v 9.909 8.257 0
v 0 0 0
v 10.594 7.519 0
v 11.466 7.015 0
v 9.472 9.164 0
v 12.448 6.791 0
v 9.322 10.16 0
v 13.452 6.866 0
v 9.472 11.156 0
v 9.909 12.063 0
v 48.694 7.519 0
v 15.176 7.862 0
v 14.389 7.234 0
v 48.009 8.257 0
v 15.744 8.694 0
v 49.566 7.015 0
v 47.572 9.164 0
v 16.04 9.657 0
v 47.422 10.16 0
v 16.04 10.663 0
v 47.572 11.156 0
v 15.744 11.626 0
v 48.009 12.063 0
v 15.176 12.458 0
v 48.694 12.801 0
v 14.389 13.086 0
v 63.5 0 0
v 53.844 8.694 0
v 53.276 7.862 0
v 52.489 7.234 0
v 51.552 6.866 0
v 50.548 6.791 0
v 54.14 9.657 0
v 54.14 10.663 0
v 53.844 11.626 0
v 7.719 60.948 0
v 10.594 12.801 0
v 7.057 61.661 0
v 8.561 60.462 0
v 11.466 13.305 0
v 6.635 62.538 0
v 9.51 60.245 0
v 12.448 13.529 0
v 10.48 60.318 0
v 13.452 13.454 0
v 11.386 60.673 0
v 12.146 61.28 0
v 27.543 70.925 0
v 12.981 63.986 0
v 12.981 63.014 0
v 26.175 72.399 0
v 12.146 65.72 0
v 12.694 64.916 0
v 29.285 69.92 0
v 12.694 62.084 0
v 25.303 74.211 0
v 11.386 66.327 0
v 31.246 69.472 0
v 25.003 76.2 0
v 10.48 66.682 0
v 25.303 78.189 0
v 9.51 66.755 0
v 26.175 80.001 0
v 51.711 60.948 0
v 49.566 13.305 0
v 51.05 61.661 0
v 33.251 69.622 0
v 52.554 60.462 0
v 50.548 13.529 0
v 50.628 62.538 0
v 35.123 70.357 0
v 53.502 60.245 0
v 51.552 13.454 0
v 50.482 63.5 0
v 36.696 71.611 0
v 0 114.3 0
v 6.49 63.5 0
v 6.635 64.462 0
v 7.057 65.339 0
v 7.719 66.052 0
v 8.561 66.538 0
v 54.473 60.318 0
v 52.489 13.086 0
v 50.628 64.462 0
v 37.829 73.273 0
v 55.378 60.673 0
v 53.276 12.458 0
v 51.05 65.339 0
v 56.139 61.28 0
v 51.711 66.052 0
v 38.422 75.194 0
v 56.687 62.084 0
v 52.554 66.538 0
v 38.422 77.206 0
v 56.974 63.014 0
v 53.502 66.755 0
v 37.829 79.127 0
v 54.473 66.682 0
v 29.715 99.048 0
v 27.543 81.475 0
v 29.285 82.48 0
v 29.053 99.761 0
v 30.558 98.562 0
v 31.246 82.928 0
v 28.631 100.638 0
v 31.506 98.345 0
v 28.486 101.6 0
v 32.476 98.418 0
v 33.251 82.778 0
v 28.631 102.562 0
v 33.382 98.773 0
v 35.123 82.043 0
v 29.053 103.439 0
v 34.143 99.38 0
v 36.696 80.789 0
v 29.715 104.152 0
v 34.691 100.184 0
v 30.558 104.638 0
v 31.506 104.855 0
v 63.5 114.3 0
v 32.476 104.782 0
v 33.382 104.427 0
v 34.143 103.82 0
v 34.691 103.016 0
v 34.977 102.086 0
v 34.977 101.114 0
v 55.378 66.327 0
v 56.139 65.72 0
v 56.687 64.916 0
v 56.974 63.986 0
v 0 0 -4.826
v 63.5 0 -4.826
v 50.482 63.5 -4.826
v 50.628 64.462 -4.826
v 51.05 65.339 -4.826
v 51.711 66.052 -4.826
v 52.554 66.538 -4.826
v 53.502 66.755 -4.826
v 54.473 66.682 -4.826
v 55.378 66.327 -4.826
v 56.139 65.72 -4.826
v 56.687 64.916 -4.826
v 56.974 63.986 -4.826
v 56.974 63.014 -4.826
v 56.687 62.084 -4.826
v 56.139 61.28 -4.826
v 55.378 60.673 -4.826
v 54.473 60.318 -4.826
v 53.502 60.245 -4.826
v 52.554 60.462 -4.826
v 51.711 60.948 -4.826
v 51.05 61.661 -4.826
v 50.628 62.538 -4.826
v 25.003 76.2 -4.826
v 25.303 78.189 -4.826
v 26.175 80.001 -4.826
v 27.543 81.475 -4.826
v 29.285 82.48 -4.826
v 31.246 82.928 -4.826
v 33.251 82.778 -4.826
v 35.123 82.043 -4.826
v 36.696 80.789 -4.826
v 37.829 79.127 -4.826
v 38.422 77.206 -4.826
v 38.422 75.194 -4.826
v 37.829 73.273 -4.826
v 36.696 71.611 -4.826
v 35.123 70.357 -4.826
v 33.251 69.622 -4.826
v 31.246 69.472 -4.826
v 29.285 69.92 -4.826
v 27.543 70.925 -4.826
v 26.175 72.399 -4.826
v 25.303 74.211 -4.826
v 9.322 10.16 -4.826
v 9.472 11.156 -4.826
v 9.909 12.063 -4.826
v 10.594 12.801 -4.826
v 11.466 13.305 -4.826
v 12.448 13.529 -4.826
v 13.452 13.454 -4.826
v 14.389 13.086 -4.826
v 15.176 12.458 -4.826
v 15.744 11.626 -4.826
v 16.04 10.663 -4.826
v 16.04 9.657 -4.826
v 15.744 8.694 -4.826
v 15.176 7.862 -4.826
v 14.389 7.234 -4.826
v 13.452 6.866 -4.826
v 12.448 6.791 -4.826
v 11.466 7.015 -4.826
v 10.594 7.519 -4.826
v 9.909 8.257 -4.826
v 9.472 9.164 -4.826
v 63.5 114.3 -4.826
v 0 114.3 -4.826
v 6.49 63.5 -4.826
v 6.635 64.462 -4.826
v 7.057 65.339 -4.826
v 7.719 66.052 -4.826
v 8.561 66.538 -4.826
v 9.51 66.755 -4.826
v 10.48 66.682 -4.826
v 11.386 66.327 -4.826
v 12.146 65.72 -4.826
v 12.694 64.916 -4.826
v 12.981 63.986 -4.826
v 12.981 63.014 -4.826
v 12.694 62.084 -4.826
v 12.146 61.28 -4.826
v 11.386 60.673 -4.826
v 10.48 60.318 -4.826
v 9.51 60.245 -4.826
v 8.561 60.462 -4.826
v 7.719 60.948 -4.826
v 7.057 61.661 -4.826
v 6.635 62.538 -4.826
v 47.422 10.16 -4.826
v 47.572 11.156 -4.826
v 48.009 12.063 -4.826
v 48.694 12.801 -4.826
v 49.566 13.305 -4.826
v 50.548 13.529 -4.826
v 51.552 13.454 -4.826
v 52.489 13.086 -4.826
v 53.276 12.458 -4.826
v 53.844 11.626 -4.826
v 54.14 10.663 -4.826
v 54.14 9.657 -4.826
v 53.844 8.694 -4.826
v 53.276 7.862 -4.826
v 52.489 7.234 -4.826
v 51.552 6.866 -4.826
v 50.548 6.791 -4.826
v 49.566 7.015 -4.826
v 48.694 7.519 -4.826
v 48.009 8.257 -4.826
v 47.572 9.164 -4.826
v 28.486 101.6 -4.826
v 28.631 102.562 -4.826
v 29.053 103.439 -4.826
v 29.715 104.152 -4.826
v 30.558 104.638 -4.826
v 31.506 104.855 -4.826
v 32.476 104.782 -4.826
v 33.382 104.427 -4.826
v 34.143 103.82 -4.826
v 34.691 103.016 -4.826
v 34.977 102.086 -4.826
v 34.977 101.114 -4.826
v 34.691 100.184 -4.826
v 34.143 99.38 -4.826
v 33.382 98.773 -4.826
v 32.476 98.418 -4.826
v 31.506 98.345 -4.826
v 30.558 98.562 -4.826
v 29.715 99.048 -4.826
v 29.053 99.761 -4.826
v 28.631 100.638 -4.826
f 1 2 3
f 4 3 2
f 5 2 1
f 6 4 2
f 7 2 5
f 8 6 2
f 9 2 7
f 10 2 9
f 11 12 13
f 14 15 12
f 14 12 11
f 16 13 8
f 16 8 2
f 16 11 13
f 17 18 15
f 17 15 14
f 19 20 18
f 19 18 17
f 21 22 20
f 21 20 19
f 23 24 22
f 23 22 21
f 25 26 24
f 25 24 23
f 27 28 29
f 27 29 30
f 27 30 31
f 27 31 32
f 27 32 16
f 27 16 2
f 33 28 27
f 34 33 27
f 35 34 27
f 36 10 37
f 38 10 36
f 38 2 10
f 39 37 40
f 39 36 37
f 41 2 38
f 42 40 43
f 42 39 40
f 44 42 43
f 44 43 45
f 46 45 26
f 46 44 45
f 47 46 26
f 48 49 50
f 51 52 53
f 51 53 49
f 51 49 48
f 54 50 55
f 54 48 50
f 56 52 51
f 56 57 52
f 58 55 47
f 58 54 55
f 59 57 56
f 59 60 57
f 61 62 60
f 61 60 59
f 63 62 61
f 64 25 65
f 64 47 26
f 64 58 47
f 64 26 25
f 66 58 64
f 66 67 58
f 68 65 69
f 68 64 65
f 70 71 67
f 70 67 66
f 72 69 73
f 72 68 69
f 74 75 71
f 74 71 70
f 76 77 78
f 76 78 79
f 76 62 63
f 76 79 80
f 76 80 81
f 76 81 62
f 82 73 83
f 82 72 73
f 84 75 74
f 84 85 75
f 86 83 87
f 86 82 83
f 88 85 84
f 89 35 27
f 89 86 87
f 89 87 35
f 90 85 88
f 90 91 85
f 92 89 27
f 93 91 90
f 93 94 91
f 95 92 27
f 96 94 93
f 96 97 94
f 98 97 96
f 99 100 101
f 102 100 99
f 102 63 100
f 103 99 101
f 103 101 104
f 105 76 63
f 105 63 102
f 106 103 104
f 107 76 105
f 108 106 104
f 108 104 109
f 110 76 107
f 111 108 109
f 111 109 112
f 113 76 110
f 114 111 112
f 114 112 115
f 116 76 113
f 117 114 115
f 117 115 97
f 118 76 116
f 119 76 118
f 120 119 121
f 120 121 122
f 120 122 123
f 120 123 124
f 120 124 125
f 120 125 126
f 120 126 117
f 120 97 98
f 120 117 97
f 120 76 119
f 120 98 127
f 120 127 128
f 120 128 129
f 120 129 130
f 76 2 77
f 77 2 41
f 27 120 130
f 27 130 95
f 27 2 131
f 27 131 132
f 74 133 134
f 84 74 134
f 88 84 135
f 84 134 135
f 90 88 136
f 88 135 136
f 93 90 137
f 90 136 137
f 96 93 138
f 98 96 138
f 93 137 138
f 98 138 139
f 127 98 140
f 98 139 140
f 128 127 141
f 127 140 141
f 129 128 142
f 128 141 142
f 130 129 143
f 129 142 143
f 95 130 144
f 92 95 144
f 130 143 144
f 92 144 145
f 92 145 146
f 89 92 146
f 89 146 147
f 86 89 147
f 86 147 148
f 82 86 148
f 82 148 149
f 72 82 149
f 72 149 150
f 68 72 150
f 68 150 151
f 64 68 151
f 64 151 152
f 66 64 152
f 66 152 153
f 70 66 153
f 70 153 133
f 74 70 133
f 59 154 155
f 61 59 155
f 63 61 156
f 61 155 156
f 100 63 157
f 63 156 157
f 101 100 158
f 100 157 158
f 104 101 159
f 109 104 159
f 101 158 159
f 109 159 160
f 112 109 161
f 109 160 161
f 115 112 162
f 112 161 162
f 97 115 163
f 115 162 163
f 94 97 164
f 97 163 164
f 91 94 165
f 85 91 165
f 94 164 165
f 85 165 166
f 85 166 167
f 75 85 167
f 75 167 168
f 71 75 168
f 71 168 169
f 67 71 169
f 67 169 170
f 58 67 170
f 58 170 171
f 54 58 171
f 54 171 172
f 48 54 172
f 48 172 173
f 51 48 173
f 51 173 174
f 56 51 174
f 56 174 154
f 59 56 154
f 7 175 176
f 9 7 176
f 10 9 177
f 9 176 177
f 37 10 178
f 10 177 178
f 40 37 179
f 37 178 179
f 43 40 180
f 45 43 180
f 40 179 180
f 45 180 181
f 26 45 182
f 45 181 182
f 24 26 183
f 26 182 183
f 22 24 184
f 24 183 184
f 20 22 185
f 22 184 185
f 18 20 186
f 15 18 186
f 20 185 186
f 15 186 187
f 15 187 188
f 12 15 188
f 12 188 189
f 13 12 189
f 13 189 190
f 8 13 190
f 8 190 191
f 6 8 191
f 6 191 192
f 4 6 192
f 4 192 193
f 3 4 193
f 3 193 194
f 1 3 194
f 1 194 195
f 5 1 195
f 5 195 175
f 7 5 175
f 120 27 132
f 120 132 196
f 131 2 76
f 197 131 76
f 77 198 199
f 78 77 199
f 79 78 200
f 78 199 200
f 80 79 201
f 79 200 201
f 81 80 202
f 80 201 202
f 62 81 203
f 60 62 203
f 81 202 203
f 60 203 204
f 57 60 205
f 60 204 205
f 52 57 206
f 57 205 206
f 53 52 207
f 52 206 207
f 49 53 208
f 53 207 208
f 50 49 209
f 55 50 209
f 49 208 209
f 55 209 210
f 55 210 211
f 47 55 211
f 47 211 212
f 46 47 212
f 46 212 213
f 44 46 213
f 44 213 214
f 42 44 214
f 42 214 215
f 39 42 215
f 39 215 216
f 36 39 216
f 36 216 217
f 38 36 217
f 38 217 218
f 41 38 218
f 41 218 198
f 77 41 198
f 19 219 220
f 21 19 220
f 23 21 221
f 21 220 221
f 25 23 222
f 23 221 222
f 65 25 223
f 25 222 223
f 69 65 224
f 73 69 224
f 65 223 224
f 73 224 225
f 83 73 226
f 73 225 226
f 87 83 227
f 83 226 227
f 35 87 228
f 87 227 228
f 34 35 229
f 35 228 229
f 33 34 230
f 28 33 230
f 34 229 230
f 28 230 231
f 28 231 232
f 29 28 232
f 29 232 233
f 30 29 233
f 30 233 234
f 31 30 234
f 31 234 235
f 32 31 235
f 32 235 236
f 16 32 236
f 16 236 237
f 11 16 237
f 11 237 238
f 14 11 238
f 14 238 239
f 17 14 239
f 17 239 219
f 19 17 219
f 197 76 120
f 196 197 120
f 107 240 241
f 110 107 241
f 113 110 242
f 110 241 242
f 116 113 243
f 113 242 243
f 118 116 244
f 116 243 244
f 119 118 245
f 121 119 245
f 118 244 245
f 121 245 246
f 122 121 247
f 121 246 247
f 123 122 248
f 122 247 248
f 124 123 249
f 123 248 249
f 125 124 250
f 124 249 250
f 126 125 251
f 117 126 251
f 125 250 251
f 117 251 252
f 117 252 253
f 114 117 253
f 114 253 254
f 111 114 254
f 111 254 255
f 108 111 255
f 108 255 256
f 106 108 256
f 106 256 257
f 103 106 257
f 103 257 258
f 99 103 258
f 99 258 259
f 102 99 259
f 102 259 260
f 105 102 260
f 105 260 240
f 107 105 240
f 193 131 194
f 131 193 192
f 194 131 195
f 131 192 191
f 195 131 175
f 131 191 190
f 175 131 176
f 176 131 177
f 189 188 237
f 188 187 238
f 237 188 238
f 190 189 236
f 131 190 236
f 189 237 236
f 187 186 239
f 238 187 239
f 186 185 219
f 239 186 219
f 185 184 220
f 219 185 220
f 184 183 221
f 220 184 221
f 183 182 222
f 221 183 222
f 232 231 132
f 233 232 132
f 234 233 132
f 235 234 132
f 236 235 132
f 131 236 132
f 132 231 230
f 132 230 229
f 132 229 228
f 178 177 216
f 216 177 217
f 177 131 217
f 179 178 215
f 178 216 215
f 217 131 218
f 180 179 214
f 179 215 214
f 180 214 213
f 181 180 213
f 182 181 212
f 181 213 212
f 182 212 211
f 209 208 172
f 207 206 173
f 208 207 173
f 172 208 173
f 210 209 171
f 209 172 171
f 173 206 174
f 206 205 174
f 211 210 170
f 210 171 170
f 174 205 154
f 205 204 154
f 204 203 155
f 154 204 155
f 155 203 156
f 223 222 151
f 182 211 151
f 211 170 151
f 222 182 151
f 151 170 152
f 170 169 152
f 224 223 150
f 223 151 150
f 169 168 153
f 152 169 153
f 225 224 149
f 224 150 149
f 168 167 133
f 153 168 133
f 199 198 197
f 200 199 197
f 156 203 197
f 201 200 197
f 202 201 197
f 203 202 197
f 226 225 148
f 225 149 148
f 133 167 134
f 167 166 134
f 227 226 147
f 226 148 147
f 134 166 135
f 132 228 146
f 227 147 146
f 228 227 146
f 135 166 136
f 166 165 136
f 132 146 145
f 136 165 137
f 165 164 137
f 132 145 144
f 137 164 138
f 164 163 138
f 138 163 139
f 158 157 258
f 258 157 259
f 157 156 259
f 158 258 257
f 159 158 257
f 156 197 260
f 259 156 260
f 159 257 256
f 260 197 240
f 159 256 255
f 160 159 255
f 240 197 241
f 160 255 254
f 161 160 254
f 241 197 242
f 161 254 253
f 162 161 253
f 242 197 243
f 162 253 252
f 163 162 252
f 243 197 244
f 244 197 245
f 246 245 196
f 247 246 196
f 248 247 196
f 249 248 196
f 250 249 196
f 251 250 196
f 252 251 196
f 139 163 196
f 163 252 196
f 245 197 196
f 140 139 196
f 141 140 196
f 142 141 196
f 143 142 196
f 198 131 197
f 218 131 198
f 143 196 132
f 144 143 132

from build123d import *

# Parameters (mm, degrees)
SKETCH1_W                        = 63.5
SKETCH1_H                        = 114.3
BOSS_EXTRUDE1_DEPTH              = 4.826
F_0_257_DIAMETER_HOLE2_D         = 6.7564
F_0_257_DIAMETER_HOLE5_D         = 6.5278
F_17_32_0_53125_DIAMETER_HOLE1_D = 13.49375


with BuildPart() as part:
    # Sketch1 → Boss-Extrude1 (new body)
    with BuildSketch(Plane.XY):
        with Locations((31.75, 57.15)):
            Rectangle(SKETCH1_W, SKETCH1_H)
    extrude(amount=-BOSS_EXTRUDE1_DEPTH)

    # F (0.257) Diameter Hole2 (through all)
    with Locations(Plane.XY):
        with Locations((12.7, 10.16), (50.8, 10.16)):
            Hole(F_0_257_DIAMETER_HOLE2_D / 2)

    # F (0.257) Diameter Hole5 (through all)
    with Locations(Plane.XY):
        with Locations((31.75, 101.6), (9.7536, 63.5), (53.7464, 63.5)):
            Hole(F_0_257_DIAMETER_HOLE5_D / 2)

    # 17/32 (0.53125) Diameter Hole1 (through all)
    with Locations(Plane.XY):
        with Locations((31.75, 76.2)):
            Hole(F_17_32_0_53125_DIAMETER_HOLE1_D / 2)


solid = part.part
